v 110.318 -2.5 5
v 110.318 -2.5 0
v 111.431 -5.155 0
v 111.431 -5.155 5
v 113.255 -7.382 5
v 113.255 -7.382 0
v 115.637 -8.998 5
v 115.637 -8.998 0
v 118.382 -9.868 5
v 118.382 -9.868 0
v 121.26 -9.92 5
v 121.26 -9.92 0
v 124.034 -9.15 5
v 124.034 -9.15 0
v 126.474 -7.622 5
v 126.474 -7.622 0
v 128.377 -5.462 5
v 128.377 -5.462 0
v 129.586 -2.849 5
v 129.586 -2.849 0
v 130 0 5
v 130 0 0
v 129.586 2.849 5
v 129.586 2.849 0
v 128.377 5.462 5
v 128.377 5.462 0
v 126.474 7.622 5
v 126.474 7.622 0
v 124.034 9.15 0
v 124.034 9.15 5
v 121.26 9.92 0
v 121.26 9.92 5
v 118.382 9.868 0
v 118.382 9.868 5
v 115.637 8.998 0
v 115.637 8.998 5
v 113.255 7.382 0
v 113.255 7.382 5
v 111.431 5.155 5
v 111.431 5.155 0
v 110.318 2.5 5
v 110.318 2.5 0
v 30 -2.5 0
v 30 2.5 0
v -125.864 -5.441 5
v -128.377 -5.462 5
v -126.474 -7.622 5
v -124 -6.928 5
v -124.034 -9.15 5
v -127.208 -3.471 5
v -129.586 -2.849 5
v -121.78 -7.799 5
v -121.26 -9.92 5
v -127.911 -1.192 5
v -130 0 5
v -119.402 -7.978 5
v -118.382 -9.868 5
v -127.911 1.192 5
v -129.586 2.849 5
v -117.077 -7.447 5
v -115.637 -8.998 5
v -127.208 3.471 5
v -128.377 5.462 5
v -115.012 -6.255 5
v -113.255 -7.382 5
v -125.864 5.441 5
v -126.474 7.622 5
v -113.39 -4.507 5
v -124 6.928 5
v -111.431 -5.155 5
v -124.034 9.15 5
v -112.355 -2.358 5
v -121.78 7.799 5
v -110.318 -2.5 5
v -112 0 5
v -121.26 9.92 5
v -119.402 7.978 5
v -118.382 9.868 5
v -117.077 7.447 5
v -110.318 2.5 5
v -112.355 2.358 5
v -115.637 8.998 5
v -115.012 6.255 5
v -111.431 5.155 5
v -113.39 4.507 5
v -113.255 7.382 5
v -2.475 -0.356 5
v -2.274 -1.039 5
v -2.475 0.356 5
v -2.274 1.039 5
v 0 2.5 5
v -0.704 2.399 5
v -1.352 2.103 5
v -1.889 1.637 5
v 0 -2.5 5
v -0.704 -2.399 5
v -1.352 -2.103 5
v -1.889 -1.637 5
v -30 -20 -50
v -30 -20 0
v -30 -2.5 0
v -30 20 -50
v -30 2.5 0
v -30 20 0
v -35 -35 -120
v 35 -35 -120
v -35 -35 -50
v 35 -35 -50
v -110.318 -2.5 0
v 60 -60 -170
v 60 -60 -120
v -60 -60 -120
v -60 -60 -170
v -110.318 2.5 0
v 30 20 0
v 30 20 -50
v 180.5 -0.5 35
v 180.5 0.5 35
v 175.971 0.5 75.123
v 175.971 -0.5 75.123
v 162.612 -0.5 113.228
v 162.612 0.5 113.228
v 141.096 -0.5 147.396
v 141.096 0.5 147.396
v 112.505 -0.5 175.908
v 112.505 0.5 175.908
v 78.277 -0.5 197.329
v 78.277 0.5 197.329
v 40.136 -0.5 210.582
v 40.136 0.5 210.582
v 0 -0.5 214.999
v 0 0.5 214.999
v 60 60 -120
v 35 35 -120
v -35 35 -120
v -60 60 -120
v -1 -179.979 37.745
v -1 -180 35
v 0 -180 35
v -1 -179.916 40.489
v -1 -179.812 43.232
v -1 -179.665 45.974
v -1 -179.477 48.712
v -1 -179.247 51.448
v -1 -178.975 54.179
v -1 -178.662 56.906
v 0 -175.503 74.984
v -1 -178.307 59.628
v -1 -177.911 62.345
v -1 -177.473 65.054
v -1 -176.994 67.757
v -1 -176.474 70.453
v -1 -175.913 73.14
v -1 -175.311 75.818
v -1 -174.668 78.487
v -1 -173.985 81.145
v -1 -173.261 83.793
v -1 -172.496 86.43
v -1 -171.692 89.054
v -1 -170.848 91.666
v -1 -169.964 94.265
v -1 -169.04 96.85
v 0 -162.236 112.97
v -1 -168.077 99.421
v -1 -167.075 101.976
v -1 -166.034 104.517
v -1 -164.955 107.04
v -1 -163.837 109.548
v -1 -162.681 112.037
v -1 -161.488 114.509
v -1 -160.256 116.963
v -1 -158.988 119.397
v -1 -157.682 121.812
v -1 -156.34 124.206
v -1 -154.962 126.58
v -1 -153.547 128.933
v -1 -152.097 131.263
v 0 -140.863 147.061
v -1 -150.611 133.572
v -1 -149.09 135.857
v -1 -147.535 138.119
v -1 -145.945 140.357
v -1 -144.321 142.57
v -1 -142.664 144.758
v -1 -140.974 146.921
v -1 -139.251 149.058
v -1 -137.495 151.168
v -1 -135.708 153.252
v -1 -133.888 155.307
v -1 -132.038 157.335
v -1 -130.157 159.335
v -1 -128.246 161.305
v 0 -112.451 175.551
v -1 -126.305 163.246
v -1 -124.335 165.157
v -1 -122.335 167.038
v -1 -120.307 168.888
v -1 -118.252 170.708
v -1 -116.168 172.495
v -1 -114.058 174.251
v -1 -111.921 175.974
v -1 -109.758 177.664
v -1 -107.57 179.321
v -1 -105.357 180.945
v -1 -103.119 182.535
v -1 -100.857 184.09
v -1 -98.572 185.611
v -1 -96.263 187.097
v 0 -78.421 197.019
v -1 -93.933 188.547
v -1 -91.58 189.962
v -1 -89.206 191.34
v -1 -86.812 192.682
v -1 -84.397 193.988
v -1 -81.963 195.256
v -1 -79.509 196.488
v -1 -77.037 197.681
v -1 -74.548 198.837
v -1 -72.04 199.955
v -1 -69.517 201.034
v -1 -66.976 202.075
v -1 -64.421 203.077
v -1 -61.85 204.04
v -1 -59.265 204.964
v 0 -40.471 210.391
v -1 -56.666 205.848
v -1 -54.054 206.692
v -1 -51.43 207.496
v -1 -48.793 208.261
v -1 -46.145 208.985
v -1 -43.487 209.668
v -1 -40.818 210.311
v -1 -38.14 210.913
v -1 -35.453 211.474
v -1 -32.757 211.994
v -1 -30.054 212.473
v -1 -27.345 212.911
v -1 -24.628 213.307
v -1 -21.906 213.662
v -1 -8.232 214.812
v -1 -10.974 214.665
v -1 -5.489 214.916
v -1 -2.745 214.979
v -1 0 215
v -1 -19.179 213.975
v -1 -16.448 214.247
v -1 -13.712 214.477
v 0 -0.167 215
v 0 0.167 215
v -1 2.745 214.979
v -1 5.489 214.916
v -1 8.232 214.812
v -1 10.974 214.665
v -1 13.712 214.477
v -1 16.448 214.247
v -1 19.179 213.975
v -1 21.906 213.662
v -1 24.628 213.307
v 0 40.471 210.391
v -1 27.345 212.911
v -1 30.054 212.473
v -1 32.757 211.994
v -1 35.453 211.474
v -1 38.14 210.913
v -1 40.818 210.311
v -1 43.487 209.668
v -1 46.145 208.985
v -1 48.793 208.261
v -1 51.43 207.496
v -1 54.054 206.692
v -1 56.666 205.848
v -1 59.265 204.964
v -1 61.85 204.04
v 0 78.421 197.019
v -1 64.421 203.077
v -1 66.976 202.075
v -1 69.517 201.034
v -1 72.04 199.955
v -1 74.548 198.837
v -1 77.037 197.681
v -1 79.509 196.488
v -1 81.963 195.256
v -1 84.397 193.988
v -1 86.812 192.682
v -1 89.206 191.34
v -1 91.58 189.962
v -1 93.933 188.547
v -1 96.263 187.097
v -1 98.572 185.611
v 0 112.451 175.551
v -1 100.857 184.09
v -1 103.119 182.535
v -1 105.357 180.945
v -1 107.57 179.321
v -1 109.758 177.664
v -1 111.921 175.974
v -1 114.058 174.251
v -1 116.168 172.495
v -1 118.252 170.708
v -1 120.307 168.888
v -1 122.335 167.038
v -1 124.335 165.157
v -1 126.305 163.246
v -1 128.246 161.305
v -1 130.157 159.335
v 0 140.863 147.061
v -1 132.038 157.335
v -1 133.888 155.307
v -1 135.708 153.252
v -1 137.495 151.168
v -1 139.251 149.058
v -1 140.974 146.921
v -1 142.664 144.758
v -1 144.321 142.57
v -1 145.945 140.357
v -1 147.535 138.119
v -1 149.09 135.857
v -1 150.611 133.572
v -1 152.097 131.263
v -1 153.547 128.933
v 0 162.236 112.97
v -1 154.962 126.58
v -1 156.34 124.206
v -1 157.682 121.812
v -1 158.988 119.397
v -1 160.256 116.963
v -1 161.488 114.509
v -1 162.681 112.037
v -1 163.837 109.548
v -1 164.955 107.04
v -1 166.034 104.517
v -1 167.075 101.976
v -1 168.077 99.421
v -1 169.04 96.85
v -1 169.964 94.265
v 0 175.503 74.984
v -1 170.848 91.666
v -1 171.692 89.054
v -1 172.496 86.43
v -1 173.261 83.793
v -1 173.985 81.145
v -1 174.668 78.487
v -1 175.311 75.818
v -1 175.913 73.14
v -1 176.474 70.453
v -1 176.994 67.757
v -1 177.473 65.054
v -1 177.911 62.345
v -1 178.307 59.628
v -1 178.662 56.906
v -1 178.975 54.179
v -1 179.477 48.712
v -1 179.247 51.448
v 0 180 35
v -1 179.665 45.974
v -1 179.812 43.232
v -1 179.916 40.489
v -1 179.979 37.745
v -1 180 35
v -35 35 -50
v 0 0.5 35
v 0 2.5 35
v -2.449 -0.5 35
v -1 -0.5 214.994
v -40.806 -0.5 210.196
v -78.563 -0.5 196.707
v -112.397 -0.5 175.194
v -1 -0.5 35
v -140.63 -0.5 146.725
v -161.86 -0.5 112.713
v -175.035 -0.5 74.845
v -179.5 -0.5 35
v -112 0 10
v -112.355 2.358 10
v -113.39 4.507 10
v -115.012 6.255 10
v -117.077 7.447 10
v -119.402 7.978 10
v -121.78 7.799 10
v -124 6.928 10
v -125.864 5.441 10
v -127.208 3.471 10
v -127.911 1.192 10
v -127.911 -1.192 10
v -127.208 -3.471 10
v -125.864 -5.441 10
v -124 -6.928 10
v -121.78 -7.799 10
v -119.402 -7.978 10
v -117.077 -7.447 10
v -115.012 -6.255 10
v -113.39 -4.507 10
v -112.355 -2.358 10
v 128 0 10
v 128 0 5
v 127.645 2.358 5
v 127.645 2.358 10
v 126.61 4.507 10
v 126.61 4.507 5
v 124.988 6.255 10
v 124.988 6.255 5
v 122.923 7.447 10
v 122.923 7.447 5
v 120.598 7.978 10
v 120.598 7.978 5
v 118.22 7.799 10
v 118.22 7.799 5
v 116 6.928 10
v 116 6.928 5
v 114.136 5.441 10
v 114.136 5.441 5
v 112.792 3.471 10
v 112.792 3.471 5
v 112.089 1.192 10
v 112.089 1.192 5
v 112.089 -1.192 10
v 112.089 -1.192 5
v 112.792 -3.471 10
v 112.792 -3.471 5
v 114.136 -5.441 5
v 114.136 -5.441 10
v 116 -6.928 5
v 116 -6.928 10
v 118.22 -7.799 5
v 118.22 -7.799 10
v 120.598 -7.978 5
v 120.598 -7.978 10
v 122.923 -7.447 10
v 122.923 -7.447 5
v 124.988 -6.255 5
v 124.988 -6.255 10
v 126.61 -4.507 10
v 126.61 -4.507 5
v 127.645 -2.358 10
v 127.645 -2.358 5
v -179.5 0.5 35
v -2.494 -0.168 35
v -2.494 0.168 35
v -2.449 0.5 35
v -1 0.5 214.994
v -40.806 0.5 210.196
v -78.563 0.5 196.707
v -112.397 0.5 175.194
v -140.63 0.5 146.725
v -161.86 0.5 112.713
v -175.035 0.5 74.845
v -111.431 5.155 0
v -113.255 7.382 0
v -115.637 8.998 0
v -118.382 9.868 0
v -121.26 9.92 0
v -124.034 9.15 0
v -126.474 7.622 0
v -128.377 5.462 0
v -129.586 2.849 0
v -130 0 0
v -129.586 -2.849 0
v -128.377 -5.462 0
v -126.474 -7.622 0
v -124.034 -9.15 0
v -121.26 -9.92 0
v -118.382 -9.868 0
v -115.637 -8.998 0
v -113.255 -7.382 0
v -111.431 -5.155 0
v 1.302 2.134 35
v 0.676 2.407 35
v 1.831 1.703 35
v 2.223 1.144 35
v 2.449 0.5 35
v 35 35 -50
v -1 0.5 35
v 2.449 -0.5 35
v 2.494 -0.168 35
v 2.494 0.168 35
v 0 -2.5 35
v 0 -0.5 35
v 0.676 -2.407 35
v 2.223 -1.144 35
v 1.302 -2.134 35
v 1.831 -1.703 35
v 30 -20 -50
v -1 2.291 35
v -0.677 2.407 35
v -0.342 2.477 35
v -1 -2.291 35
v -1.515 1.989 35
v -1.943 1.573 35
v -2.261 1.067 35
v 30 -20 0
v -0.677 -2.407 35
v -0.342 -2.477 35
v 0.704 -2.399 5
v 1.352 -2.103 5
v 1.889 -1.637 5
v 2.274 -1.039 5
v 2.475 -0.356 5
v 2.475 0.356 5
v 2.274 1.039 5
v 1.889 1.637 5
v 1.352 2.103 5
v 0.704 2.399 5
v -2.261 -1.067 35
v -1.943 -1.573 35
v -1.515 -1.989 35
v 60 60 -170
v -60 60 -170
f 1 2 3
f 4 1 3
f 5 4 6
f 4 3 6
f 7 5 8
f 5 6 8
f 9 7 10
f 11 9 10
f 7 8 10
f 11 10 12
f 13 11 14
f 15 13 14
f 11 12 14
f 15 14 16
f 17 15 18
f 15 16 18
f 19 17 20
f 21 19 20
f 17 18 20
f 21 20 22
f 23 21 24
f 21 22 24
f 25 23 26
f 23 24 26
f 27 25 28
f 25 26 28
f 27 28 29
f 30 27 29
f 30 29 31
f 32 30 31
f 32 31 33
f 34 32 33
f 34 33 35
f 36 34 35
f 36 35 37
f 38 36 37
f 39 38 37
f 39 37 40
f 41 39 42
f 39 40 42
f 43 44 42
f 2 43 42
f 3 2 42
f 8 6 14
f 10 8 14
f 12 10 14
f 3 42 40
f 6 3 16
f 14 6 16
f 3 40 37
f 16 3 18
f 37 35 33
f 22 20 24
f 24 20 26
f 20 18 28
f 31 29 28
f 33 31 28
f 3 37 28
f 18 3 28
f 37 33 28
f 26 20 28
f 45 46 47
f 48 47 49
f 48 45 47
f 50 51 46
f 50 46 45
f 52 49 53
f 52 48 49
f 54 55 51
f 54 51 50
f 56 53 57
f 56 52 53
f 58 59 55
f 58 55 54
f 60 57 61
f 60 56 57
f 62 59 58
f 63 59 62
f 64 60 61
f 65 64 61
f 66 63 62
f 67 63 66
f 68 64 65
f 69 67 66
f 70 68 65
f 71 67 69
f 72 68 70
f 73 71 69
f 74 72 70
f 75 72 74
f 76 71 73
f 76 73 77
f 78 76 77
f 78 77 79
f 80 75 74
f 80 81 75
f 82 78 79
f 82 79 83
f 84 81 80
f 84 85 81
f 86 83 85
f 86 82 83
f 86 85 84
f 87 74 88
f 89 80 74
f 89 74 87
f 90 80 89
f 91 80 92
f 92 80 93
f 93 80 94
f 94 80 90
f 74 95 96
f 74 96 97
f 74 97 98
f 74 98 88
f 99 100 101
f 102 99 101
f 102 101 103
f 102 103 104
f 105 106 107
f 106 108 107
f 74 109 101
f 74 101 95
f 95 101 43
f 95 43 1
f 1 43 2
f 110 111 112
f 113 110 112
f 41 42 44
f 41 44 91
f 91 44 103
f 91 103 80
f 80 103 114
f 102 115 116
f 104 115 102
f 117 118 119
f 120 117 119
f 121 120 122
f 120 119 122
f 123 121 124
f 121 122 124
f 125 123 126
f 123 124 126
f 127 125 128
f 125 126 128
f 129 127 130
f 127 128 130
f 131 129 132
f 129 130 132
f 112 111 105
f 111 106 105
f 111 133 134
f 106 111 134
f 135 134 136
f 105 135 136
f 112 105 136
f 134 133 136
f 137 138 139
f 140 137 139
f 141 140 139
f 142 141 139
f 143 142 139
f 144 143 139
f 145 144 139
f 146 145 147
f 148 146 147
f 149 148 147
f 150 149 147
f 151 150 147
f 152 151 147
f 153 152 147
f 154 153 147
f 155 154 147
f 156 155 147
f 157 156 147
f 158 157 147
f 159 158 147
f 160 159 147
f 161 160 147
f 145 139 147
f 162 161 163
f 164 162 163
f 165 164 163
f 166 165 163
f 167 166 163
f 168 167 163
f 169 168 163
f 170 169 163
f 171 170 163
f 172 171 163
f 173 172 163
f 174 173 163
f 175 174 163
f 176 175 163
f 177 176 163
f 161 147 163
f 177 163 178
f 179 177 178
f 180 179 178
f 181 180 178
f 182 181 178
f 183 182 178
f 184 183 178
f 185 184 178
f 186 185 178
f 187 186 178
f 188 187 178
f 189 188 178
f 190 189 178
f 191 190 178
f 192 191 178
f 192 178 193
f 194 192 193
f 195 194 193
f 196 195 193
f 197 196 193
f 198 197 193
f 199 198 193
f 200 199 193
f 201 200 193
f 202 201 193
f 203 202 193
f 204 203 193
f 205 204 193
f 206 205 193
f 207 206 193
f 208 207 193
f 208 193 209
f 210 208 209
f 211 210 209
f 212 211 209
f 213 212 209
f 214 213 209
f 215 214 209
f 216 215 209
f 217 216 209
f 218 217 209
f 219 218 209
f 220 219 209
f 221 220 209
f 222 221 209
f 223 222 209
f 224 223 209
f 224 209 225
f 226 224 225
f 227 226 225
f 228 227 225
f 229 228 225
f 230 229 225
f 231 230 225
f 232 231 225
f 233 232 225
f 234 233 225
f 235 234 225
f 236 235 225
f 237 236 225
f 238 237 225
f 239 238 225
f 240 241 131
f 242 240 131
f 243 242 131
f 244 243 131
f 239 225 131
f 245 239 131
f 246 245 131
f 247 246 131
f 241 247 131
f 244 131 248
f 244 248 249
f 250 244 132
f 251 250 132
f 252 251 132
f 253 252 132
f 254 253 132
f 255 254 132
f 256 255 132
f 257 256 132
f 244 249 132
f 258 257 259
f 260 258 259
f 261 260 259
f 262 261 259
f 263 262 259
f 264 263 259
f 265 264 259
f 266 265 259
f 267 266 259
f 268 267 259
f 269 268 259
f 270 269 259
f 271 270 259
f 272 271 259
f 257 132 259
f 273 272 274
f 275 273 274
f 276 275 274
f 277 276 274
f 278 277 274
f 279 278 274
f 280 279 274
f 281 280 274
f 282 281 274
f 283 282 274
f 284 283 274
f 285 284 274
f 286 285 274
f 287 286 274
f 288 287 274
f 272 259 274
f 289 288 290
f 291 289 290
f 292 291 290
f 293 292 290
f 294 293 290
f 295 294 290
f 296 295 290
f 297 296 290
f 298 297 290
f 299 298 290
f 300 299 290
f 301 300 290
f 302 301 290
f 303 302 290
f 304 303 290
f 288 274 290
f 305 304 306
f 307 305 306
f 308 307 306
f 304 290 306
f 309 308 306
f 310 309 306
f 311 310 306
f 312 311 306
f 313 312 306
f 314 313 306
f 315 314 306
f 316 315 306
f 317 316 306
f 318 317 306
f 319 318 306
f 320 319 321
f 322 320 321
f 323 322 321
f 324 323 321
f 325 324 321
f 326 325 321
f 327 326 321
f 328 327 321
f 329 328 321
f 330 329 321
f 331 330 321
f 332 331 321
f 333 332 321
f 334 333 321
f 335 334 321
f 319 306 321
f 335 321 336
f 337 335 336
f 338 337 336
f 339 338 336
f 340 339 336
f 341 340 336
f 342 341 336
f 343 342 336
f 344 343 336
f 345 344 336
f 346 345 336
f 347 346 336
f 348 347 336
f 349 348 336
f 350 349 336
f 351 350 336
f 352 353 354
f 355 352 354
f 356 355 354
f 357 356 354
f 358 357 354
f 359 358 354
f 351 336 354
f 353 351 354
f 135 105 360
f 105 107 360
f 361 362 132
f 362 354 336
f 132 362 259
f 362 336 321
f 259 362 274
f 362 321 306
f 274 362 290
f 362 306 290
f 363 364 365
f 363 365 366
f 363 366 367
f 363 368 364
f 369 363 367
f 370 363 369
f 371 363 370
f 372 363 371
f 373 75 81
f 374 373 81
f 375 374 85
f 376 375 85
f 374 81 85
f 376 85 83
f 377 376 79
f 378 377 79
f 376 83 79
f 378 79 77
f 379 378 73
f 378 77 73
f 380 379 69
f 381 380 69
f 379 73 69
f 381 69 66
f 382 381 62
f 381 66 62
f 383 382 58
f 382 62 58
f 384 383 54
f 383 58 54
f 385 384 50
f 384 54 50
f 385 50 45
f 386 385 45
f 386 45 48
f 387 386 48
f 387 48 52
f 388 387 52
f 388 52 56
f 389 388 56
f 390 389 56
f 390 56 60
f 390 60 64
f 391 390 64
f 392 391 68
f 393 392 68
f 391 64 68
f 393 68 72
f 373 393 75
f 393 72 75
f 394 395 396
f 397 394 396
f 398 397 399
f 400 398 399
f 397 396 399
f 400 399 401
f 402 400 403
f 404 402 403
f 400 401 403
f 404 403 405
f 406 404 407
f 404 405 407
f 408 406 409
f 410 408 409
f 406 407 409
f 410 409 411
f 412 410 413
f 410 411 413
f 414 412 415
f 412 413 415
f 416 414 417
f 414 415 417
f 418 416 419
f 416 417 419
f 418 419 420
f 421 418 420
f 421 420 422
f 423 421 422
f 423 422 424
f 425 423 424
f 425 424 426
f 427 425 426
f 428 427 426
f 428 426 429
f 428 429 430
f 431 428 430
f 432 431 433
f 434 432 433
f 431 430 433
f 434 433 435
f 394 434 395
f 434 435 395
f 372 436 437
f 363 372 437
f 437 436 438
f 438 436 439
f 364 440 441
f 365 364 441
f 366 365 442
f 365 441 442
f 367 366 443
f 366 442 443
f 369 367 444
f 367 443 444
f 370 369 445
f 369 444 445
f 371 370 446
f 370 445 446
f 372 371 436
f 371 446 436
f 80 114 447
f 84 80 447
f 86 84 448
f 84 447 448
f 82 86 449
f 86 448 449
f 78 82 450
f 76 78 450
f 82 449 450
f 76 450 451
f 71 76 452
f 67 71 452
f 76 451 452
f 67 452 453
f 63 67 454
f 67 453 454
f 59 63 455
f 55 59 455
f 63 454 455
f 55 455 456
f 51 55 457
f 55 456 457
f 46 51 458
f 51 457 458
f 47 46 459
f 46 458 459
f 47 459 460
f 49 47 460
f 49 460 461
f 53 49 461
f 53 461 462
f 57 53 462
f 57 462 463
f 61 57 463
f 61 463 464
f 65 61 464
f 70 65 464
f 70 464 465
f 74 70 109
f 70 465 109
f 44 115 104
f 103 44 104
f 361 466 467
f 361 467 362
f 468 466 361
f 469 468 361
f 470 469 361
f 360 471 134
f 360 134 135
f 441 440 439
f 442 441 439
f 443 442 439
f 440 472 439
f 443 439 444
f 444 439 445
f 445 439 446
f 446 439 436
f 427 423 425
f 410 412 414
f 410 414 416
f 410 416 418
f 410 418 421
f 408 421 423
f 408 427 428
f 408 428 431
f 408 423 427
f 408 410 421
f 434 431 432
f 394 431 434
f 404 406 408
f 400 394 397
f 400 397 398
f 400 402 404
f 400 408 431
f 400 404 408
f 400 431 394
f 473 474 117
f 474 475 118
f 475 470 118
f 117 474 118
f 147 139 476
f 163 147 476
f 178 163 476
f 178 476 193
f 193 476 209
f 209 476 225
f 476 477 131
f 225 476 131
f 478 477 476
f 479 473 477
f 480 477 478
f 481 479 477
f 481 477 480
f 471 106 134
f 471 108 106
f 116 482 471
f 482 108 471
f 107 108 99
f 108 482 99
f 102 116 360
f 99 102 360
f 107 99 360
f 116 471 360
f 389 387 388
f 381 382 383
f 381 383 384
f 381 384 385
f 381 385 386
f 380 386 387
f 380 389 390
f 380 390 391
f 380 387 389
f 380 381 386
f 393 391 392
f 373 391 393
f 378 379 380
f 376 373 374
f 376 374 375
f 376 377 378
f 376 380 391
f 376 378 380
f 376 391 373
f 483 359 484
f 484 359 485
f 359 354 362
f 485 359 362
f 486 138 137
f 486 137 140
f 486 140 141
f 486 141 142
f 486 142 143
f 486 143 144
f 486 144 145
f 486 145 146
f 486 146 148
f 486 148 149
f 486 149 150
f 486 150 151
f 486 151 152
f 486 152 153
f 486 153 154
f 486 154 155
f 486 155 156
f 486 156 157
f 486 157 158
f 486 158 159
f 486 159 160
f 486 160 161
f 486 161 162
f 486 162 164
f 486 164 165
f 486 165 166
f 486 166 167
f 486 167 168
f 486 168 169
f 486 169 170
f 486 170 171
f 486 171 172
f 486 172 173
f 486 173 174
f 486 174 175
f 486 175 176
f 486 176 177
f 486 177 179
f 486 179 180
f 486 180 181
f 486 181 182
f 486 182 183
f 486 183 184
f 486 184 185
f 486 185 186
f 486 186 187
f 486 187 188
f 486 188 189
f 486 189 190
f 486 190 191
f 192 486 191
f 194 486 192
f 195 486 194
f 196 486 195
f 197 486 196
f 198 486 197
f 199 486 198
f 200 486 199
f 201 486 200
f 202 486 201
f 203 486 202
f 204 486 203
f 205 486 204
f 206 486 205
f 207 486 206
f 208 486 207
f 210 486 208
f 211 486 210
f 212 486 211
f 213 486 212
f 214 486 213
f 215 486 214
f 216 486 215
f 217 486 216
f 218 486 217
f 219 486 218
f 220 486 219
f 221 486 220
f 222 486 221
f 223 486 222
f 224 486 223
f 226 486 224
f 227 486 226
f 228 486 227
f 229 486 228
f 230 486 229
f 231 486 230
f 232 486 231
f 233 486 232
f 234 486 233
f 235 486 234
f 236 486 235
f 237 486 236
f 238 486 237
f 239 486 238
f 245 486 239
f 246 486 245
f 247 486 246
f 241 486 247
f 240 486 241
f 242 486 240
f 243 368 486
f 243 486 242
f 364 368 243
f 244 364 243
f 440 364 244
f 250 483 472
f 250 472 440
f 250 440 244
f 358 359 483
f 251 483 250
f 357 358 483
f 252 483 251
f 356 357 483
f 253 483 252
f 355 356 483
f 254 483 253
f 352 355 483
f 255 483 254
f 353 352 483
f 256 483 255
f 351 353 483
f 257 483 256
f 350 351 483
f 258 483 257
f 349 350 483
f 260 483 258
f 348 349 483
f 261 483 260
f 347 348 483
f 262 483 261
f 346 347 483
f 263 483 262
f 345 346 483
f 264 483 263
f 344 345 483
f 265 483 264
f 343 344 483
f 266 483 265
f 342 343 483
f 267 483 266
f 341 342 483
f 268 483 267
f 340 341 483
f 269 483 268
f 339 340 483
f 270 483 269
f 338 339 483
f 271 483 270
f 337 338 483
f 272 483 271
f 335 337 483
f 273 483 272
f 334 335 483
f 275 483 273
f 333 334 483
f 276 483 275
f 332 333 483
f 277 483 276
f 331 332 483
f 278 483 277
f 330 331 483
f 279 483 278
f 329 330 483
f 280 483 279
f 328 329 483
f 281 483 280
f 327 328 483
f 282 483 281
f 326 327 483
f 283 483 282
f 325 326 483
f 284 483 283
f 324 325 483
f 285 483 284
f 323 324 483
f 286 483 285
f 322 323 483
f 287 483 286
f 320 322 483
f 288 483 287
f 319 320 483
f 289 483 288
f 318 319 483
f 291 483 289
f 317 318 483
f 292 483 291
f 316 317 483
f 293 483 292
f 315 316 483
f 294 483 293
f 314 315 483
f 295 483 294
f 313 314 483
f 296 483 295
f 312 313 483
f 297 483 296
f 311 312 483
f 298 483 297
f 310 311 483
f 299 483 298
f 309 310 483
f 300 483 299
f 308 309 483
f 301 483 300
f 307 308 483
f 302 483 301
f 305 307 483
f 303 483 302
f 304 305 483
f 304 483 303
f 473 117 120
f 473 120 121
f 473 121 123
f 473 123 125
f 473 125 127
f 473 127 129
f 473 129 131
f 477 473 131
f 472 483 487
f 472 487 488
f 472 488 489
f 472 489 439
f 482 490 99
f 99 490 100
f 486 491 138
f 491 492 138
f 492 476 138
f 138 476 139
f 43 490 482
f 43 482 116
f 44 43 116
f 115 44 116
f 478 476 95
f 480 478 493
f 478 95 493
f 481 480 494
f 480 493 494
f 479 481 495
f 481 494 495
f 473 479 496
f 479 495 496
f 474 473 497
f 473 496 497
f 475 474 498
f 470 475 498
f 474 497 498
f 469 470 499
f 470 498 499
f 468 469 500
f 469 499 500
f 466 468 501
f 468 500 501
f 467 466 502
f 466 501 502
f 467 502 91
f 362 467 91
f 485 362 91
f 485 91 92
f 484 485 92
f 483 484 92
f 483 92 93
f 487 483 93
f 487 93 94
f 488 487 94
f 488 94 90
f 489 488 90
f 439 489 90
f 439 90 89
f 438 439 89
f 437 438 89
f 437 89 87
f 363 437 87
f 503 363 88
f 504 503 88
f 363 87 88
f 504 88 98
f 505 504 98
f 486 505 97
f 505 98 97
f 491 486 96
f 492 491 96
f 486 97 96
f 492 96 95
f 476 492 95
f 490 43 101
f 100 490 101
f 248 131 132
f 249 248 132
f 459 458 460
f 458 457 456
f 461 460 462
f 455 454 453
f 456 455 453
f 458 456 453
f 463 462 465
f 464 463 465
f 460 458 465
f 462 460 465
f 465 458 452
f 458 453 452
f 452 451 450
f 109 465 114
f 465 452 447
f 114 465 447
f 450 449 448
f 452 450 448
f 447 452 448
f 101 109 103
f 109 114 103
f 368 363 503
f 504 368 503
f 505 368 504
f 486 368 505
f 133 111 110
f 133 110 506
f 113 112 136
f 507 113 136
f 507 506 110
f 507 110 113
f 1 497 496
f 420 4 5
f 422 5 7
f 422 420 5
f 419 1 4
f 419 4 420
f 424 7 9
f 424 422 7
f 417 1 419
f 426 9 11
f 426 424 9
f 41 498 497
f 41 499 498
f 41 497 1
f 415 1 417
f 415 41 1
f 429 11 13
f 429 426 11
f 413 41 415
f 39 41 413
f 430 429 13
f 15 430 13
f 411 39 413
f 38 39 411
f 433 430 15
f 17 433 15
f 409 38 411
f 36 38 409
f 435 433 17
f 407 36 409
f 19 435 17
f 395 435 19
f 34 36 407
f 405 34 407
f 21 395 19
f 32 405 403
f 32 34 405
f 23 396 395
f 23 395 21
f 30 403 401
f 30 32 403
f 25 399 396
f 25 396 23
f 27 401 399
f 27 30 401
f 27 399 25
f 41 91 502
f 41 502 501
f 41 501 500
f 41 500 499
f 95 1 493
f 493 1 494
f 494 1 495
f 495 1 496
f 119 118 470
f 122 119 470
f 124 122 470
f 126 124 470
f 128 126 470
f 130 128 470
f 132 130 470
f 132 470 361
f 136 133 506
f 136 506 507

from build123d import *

# Parameters (mm, degrees)
EXTRUDE_2_DEPTH       = 5
SKETCH_3_R            = 8
EXTRUDE_3_DEPTH       = 5
SKETCH_4_W            = 60
SKETCH_4_H            = 40
EXTRUDE_4_DEPTH       = 50
SKETCH_5_W            = 70
SKETCH_5_H            = 70
EXTRUDE_5_DEPTH       = 30
SKETCH_6_R            = 2.5
EXTRUDE_6_DEPTH       = 30
EXTRUDE_11_DEPTH      = 0.5
EXTRUDE_11_DEPTH_BACK = 0.5
EXTRUDE_12_DEPTH      = 0.5
EXTRUDE_12_DEPTH_BACK = 0.5
SKETCH_12_W           = 70
SKETCH_12_H           = 70
EXTRUDE_13_DEPTH      = 40
SKETCH_13_W           = 120
SKETCH_13_H           = 120
EXTRUDE_14_DEPTH      = 50


with BuildPart() as part:
    # 草图1 → 凸台-拉伸2 (new body)
    with BuildSketch(Plane.XY):
        with BuildLine():
            ThreePointArc((-110.317541634, 2.5), (-130, 0), (-110.317541634, -2.5))
            Line((-110.317541634, -2.5), (110.317541634, -2.5))
            ThreePointArc((110.317541634, -2.5), (130, 0), (110.317541634, 2.5))
            Line((110.317541634, 2.5), (-110.317541634, 2.5))
        make_face()
    extrude(amount=EXTRUDE_2_DEPTH)

    # 草图3 → 凸台-拉伸3 (add)
    with BuildSketch(Plane.XY.offset(5)):
        with Locations((-120, 0)):
            Circle(SKETCH_3_R)
        with Locations((120, 0)):
            Circle(SKETCH_3_R)
    extrude(amount=EXTRUDE_3_DEPTH)

    # 草图4 → 凸台-拉伸4 (add)
    with BuildSketch(Plane(origin=(0, 0, 0), x_dir=(-1, 0, 0), z_dir=(0, 0, -1))):
        Rectangle(SKETCH_4_W, SKETCH_4_H)
    extrude(amount=EXTRUDE_4_DEPTH)

    # 草图5 → 凸台-拉伸5 (add)
    with BuildSketch(Plane(origin=(0, 0, -50), x_dir=(-1, 0, 0), z_dir=(0, 0, -1))):
        Rectangle(SKETCH_5_W, SKETCH_5_H)
    extrude(amount=EXTRUDE_5_DEPTH)

    # 草图6 → 凸台-拉伸6 (add)
    with BuildSketch(Plane.XY.offset(5)):
        with Locations(Location((0, 0, 0), (0, 0, 270))):
            Circle(SKETCH_6_R)
    extrude(amount=EXTRUDE_6_DEPTH)

    # 草图10 → 凸台-拉伸11 (add, two sides: drawn at the far end of the back side and taken through both)
    with BuildSketch(Plane(origin=(0, 0, 0), x_dir=(-1, 0, 0), z_dir=(0, -1, 0)).offset(-EXTRUDE_11_DEPTH_BACK)):
        with BuildLine():
            Line((179.5, -35), (-180.5, -35))
            ThreePointArc((-180.5, -35), (-0.5, -215), (179.5, -35))
        make_face()
    extrude(amount=EXTRUDE_11_DEPTH + EXTRUDE_11_DEPTH_BACK)

    # 草图11 → 凸台-拉伸12 (add, two sides: drawn at the far end of the back side and taken through both)
    with BuildSketch(Plane.ZY.offset(0.5).offset(-EXTRUDE_12_DEPTH_BACK)):
        with BuildLine():
            Line((35, 180), (35, -180))
            ThreePointArc((35, -180), (215, 0), (35, 180))
        make_face()
    extrude(amount=EXTRUDE_12_DEPTH + EXTRUDE_12_DEPTH_BACK)

    # 草图12 → 凸台-拉伸13 (add)
    with BuildSketch(Plane(origin=(0, 0, -80), x_dir=(-1, 0, 0), z_dir=(0, 0, -1))):
        Rectangle(SKETCH_12_W, SKETCH_12_H)
    extrude(amount=EXTRUDE_13_DEPTH)

    # 草图13 → 凸台-拉伸14 (add)
    with BuildSketch(Plane(origin=(0, 0, -120), x_dir=(-1, 0, 0), z_dir=(0, 0, -1))):
        Rectangle(SKETCH_13_W, SKETCH_13_H)
    extrude(amount=EXTRUDE_14_DEPTH)


solid = part.part
